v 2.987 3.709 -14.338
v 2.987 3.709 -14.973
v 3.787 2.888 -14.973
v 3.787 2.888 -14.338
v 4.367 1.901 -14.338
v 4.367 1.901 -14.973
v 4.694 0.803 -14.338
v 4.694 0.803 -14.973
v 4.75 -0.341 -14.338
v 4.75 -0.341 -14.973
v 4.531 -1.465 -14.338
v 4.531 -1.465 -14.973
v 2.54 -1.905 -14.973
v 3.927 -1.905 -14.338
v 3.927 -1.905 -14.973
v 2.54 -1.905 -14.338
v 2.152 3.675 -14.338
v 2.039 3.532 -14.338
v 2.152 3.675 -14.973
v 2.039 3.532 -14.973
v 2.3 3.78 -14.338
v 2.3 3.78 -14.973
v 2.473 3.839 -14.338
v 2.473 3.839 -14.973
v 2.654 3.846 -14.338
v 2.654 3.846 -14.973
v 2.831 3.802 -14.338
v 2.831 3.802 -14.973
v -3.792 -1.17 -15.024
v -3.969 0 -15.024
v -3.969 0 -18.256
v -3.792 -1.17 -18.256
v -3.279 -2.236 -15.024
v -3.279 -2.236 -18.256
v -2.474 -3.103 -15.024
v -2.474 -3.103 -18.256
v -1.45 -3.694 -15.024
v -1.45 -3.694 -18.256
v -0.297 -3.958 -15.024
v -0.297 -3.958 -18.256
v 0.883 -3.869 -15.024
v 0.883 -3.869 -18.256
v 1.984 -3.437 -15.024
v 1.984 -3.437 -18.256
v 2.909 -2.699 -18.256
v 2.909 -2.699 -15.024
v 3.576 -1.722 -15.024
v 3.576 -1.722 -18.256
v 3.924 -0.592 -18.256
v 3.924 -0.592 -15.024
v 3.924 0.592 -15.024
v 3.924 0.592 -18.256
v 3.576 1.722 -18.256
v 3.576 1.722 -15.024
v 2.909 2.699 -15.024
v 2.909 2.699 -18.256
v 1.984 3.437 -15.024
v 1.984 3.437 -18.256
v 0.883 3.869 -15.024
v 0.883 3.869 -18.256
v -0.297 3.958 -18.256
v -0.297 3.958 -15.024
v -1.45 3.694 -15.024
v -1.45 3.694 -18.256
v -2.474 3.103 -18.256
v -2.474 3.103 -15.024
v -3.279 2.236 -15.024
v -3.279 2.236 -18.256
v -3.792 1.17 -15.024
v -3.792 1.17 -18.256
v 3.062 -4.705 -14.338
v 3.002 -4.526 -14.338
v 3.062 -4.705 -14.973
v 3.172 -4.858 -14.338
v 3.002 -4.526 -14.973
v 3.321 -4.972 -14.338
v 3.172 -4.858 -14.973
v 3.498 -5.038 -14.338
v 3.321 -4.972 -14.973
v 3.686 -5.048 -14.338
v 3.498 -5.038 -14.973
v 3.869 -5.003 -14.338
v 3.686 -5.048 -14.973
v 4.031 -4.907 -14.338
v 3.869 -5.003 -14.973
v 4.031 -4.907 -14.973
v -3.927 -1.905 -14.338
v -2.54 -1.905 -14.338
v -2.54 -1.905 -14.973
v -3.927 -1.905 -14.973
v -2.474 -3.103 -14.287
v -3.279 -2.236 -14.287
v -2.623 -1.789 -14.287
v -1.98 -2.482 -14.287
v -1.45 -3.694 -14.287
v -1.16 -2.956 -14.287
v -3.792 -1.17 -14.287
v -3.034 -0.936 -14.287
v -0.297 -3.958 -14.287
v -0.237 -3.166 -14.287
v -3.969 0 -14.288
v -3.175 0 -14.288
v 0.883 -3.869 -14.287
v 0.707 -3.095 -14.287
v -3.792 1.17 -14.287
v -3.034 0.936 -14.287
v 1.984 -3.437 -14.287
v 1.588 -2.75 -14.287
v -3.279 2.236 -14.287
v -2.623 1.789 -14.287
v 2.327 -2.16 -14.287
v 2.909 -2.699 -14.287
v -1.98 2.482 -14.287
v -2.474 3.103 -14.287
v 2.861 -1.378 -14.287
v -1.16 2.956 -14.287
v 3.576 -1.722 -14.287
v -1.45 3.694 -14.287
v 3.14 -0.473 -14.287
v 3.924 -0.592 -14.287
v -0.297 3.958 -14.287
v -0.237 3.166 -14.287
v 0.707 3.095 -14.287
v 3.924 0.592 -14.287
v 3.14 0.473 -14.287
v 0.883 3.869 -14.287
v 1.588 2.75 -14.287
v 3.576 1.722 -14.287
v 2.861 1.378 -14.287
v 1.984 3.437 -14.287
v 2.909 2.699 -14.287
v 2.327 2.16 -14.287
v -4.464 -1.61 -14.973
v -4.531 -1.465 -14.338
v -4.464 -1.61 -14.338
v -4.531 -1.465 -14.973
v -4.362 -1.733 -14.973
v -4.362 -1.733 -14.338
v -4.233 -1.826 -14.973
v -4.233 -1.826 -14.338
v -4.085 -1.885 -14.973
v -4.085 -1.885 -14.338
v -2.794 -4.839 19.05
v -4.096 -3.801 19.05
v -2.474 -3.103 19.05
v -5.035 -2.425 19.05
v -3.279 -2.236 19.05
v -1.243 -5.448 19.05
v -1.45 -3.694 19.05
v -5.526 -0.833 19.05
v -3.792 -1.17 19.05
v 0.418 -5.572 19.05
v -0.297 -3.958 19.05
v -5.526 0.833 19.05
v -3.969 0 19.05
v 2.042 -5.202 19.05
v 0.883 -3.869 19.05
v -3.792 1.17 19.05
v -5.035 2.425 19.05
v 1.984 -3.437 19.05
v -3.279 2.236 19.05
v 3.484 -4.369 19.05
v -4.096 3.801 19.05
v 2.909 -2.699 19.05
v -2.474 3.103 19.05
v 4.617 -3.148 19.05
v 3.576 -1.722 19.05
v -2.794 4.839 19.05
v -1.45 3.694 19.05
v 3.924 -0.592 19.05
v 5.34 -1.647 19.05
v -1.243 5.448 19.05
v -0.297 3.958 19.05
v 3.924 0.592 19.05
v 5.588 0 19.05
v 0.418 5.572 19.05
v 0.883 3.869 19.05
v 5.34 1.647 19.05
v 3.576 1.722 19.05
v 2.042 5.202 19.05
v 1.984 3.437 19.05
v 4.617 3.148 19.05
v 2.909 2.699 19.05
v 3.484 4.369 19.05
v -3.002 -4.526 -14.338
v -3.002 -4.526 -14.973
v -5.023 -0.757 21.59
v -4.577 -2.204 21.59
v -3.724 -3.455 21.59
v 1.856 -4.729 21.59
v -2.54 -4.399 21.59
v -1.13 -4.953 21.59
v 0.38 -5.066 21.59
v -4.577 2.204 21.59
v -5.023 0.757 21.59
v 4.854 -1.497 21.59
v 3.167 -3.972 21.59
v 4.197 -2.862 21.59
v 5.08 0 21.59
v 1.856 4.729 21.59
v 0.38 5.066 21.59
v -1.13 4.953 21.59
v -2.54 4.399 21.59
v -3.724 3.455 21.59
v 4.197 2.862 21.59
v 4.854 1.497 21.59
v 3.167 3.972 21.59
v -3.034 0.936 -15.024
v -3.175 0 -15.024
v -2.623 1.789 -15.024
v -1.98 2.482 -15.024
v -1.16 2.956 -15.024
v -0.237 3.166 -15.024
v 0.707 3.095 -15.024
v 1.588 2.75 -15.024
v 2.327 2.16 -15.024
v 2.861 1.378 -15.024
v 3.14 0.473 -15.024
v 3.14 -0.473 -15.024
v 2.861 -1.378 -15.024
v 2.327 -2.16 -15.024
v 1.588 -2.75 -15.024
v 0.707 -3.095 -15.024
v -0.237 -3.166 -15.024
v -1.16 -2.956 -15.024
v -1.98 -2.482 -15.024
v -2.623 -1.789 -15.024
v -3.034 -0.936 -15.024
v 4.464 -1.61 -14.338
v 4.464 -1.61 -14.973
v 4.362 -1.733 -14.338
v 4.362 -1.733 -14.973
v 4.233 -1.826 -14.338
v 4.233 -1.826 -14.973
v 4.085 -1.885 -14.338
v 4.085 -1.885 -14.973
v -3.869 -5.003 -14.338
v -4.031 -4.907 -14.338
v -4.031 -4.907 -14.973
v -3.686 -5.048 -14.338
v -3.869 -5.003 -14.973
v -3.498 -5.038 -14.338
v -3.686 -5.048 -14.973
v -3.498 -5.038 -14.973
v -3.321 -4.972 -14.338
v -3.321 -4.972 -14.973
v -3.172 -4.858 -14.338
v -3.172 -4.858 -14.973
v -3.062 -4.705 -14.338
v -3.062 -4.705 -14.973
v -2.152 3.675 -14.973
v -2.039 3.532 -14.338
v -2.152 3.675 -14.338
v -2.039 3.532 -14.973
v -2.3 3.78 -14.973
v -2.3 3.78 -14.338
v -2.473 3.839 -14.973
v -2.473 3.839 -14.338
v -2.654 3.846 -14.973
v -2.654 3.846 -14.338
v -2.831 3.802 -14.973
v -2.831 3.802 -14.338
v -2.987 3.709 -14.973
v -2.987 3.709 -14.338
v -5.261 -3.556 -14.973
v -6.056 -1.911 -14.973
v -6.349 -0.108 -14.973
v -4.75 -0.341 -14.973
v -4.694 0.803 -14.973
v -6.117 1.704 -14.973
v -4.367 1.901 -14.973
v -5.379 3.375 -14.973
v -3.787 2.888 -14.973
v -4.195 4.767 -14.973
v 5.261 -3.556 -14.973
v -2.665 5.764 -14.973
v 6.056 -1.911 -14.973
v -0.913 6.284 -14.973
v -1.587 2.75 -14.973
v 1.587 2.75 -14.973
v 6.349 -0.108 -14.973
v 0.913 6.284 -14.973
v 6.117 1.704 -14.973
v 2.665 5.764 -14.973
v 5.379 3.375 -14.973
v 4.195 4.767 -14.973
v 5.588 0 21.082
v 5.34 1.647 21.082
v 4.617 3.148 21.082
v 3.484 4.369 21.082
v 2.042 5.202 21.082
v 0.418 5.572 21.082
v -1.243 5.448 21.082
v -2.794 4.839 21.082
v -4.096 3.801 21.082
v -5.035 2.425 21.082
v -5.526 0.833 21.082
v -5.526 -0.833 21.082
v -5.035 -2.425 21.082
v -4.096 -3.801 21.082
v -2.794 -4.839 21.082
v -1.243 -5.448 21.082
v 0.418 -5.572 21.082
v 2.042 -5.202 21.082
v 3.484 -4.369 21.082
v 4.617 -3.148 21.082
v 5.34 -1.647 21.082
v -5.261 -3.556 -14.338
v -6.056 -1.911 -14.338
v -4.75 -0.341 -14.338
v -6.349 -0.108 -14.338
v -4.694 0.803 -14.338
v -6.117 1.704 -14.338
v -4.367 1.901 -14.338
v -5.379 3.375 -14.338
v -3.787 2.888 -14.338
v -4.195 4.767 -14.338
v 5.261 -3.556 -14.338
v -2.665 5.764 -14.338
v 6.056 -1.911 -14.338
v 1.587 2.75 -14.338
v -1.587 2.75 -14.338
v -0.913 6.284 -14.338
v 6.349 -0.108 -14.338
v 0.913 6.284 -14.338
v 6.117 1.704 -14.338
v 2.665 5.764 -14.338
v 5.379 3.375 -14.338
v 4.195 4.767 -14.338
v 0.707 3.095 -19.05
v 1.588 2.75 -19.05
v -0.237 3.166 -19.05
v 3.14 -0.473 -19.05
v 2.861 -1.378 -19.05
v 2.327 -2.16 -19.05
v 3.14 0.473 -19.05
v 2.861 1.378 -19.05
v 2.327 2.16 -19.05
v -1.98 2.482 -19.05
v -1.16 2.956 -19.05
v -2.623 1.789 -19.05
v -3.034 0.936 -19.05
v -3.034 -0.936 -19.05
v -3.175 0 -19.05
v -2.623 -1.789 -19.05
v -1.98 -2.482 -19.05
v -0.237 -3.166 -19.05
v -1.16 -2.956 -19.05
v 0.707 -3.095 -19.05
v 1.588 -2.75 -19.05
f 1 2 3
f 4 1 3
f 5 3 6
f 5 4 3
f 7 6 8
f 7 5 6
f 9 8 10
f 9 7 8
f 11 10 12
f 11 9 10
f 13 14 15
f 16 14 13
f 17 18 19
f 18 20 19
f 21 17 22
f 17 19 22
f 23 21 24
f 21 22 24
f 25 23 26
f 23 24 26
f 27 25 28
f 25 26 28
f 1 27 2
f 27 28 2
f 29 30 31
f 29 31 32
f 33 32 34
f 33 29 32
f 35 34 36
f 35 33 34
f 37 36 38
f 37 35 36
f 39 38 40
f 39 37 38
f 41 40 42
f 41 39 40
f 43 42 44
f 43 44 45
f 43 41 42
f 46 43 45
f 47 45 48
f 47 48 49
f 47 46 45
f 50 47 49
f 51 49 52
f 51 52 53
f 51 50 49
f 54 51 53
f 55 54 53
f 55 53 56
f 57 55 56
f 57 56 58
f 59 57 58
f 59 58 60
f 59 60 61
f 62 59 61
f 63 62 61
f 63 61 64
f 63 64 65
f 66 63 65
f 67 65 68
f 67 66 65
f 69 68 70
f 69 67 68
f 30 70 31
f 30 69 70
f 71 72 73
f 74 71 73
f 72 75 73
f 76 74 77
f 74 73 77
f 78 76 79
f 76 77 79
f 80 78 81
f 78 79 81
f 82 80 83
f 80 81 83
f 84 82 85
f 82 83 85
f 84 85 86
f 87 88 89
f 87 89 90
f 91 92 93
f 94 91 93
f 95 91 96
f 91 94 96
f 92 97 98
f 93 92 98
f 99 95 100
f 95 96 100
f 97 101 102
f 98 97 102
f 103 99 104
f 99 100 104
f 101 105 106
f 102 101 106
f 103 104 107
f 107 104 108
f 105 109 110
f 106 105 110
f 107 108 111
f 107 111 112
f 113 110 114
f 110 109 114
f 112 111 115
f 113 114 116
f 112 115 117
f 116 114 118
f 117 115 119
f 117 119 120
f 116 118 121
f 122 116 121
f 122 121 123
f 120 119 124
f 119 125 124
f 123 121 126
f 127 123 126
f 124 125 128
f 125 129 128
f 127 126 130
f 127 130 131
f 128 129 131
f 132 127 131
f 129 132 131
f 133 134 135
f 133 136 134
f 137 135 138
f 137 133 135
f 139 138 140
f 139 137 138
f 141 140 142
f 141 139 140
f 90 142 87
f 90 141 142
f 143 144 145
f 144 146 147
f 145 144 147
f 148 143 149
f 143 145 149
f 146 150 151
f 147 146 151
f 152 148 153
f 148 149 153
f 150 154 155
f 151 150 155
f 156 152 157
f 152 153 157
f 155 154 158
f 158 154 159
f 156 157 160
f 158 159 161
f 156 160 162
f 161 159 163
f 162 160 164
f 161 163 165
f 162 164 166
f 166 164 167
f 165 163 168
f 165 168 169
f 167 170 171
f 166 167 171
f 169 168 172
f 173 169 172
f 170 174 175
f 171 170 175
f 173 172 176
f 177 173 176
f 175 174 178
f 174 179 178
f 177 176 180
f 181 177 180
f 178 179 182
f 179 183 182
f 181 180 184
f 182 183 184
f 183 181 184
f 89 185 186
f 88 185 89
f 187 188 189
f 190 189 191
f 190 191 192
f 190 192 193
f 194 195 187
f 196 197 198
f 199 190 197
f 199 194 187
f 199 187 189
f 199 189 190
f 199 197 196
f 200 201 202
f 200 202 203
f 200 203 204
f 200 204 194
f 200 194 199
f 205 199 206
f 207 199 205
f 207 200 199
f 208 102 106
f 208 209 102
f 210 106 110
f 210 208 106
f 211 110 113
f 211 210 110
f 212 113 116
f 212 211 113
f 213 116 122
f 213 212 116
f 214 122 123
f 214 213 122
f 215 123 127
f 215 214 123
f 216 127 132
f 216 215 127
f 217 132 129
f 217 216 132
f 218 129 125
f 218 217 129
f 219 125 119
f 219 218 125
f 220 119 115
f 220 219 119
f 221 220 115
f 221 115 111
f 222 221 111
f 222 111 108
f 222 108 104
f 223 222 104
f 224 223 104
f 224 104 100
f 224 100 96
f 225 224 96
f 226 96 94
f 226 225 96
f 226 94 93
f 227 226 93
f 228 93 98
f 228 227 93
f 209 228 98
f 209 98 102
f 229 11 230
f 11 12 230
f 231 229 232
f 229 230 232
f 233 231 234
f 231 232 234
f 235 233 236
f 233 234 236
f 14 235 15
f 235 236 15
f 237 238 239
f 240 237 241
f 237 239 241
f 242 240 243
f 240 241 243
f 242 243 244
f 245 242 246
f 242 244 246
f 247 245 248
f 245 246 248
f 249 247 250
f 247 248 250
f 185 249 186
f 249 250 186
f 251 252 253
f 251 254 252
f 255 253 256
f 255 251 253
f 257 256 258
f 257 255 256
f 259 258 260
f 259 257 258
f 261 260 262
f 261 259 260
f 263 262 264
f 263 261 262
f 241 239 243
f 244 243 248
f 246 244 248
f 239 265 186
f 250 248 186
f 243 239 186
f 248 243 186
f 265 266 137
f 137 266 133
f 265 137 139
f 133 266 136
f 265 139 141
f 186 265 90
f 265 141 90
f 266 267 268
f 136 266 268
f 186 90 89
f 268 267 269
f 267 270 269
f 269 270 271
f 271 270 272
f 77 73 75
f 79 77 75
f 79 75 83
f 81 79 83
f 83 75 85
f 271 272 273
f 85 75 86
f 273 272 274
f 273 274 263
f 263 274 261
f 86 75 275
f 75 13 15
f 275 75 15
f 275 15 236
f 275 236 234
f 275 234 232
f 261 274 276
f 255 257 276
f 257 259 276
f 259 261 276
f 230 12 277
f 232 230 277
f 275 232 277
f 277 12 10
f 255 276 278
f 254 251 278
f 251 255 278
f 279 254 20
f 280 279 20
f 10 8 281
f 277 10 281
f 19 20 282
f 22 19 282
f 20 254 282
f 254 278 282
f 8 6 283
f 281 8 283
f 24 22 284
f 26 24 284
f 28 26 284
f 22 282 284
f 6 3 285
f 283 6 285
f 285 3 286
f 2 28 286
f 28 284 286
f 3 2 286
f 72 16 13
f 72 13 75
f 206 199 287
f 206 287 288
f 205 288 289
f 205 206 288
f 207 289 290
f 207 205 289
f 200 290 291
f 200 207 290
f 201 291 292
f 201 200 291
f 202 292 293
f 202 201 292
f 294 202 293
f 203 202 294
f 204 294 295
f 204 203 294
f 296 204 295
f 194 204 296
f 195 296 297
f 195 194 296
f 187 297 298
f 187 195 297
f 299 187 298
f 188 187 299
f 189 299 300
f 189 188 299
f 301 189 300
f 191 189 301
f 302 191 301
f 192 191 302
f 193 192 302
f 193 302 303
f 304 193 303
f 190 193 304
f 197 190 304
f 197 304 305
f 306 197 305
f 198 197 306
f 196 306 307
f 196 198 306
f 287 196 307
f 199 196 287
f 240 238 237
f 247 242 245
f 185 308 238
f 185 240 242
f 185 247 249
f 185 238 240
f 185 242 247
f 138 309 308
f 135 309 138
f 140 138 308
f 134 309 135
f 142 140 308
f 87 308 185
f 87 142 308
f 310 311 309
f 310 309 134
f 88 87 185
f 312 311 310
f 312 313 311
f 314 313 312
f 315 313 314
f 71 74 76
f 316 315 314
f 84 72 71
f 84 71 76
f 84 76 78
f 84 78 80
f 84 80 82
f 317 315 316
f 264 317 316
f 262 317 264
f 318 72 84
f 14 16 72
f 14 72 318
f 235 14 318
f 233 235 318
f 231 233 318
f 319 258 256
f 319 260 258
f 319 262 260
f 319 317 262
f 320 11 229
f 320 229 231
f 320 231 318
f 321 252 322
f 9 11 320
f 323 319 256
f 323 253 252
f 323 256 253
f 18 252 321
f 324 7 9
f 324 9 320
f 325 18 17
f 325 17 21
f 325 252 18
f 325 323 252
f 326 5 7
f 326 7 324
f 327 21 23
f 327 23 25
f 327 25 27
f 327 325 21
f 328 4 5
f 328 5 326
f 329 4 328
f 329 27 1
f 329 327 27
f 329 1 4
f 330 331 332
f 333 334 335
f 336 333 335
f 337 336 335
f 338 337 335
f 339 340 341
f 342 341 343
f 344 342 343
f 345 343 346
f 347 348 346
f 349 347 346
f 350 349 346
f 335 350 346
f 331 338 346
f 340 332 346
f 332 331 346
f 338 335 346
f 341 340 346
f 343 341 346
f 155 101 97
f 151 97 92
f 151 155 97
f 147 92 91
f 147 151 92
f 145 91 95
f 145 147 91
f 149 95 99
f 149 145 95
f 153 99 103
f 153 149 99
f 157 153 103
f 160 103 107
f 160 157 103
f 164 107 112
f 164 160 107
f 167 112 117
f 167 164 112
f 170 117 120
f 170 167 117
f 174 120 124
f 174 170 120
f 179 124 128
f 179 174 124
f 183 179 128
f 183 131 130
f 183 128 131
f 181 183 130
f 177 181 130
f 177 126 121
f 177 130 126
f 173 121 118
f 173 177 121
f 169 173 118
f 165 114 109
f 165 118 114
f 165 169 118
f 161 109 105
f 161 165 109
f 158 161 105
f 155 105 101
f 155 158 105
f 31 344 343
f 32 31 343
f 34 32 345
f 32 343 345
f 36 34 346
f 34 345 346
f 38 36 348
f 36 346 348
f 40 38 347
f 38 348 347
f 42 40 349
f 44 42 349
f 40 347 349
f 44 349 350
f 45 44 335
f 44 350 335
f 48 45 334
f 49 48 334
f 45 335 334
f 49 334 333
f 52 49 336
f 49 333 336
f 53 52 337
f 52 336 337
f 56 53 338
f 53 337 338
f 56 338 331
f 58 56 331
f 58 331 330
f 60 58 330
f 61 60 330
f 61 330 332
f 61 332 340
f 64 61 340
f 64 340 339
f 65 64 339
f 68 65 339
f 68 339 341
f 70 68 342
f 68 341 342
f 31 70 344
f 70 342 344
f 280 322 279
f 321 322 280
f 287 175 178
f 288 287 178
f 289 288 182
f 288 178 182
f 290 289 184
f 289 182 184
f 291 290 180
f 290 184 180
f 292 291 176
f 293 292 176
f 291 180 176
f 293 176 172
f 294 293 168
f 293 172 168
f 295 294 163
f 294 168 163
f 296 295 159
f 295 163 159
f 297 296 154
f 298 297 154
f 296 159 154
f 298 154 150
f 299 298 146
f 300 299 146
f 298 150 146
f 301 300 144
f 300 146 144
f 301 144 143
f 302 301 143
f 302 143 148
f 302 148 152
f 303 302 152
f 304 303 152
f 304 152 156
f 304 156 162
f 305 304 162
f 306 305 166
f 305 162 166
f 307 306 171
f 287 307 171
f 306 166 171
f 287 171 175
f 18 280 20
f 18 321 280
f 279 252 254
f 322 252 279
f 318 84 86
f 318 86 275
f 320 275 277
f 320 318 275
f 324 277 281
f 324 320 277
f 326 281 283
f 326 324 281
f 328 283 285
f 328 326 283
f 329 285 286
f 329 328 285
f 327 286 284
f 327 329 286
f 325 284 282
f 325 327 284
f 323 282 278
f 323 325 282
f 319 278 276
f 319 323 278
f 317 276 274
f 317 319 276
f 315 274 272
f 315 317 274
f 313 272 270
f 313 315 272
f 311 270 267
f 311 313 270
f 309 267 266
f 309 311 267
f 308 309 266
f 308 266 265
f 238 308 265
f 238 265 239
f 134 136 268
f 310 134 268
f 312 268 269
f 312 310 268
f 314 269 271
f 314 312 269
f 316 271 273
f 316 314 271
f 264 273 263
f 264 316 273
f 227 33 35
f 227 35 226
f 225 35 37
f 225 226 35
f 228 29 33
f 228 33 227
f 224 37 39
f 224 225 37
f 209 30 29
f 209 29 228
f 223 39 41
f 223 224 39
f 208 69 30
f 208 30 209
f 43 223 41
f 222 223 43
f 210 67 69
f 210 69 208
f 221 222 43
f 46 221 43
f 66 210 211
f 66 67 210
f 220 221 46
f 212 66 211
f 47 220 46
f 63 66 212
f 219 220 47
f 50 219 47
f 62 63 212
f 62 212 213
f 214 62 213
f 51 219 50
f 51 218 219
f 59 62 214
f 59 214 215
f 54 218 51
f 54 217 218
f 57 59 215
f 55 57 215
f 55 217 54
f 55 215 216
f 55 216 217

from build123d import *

# Parameters (mm, degrees)
SKETCH2_R      = 3.96875
EXTRUDE1_DEPTH = 19.05
SKETCH3_W      = 0.7366
SKETCH3_H      = 0.79375
SKETCH8_R      = 5.588
EXTRUDE6_DEPTH = 2.54
CHAMFER2_SIZE  = 0.508
SKETCH4_R      = 6.35
SKETCH4_R_2    = 3.175
EXTRUDE2_DEPTH = 0.3175
EXTRUDE4_DEPTH = 24.383179852
EXTRUDE5_DEPTH = 0.635
FILLET1_R      = 0.635
CHAMFER1_SIZE  = 0.79375


with BuildPart() as part:
    # Sketch2 → Extrude1 (new, symmetric)
    with BuildSketch(Plane.XY):
        with Locations(Location((0, 0, 0), (0, 0, 180))):
            Circle(SKETCH2_R)
    extrude(amount=EXTRUDE1_DEPTH, both=True)

    # Sketch3 → Cut-Revolve1 (revolve, cut)
    with BuildSketch(Plane(origin=(0, 0, 0), x_dir=(0, 0, -1), z_dir=(1, 0, 0)), mode=Mode.PRIVATE) as cut_revolve1_sk:
        with Locations((14.6558, 3.571875)):
            Rectangle(SKETCH3_W, SKETCH3_H)
    revolve(cut_revolve1_sk.sketch.rotate(Axis((0, 0, 19.05), (0, 0, -1)), 270), axis=Axis((0, 0, 19.05), (0, 0, -1)), mode=Mode.SUBTRACT)

    # Sketch8 → Extrude6 (add)
    with BuildSketch(Plane.XY.offset(19.05)):
        Circle(SKETCH8_R)
    extrude(amount=EXTRUDE6_DEPTH)

    # Chamfer2
    chamfer2_edges = [part.edges().sort_by_distance(p)[0] for p in [
        (-5.588, 0, 21.59),
    ]]
    chamfer(chamfer2_edges, length=CHAMFER2_SIZE)

    # Chamfer1
    chamfer1_edges = [part.edges().sort_by_distance(p)[0] for p in [
        (3.96875, 0, -19.05),
    ]]
    chamfer(chamfer1_edges, length=CHAMFER1_SIZE)


with BuildPart() as body_2:
    # Sketch4 → Extrude2 (new, symmetric)
    with BuildSketch(Plane.XY.offset(-14.6558)):
        Circle(SKETCH4_R)
        Circle(SKETCH4_R_2, mode=Mode.SUBTRACT)
    extrude(amount=EXTRUDE2_DEPTH, both=True)

    # Sketch5 → Extrude4 (cut, through all)
    with BuildSketch(Plane.XY):
        with BuildLine():
            Line((-2.38125, 4.124445986), (0, 0))
            Line((0, 0), (2.38125, 4.124445986))
            ThreePointArc((2.38125, 4.124445986), (4.523958552, 1.488356568), (4.364903349, -1.905))
            Line((4.364903349, -1.905), (2.54, -1.905))
            Line((2.54, -1.905), (3.173879308, -5.499908194))
            ThreePointArc((3.173879308, -5.499908194), (0, -6.35), (-3.173879308, -5.499908194))
            Line((-3.173879308, -5.499908194), (-2.54, -1.905))
            Line((-2.54, -1.905), (-4.364903349, -1.905))
            ThreePointArc((-4.364903349, -1.905), (-4.523958552, 1.488356568), (-2.38125, 4.124445986))
        make_face()
    extrude(amount=-EXTRUDE4_DEPTH, mode=Mode.SUBTRACT)

    # Sketch6 → Extrude5 (add)
    with BuildSketch(Plane.XY.offset(-14.3383)):
        with BuildLine():
            Line((-1.5875, 2.749630657), (1.5875, 2.749630657))
            ThreePointArc((1.5875, 2.749630657), (0, 3.175), (-1.5875, 2.749630657))
        make_face()
    extrude(amount=-EXTRUDE5_DEPTH)

    # Fillet1
    fillet1_edges = [body_2.edges().sort_by_distance(p)[0] for p in [
        (2.38125, 4.124445986, -14.6558),
        (3.173879308, -5.499908194, -14.6558),
        (-4.364903349, -1.905, -14.6558),
        (4.364903349, -1.905, -14.6558),
        (-3.173879308, -5.499908194, -14.6558),
        (-2.38125, 4.124445986, -14.6558),
    ]]
    fillet(fillet1_edges, radius=FILLET1_R)


solid = Compound([part.part, body_2.part])
